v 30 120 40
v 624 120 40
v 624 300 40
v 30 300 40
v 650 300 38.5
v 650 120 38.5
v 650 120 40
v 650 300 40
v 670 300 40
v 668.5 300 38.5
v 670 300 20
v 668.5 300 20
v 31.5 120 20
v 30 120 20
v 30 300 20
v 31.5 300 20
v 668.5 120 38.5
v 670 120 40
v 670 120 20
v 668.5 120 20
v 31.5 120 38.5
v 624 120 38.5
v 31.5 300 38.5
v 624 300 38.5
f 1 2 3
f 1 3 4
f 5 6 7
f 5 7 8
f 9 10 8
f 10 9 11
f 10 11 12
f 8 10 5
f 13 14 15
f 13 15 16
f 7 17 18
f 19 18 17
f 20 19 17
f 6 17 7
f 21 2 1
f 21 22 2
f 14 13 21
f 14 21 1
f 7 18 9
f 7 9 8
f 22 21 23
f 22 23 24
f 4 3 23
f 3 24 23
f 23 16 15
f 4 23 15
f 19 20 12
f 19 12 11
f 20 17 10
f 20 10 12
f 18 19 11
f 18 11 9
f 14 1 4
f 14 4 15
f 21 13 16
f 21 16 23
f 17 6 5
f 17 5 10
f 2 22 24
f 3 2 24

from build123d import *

# Parameters (mm, degrees)
PACK_PANO_KAPAGI_KAPAK_1_START = 120
PACK_PANO_KAPAGI_KAPAK_1_DEPTH = 180
PACK_PANO_KAPAGI_KAPAK_2_START = 27
SKETCH2_W                      = 26
SKETCH2_H                      = 180
PACK_PANO_KAPAGI_KAPAK_2_DEPTH = 14


with BuildPart() as part:
    # Sketch1 → PACK_pano_kapagi_kapak_1 (new body)
    with BuildSketch(Plane(origin=(0, 0, 0), x_dir=(1, 0, 0), z_dir=(0, 1, 0)).offset(PACK_PANO_KAPAGI_KAPAK_1_START)):
        Polygon((30, -40), (30, -20), (31.5, -20), (31.5, -38.5), (668.5, -38.5), (668.5, -20), (670, -20), (670, -40), align=None)
    extrude(amount=PACK_PANO_KAPAGI_KAPAK_1_DEPTH)

    # Sketch2 → PACK_pano_kapagi_kapak_2 (cut)
    with BuildSketch(Plane.XY.offset(PACK_PANO_KAPAGI_KAPAK_2_START)):
        with Locations((637, 210)):
            Rectangle(SKETCH2_W, SKETCH2_H)
    extrude(amount=PACK_PANO_KAPAGI_KAPAK_2_DEPTH, mode=Mode.SUBTRACT)


with BuildPart() as pack_pano_kapagi_kapak_2_piece_1:
    # of the separate pieces the step leaves, piece 1, a body of its own (pack_pano_kapagi_kapak_2_pieces)
    add(part.part.solids().sort_by_distance((30, 120, 40))[0])


with BuildPart() as pack_pano_kapagi_kapak_2_piece_2:
    # of the separate pieces the step leaves, piece 2, a body of its own (pack_pano_kapagi_kapak_2_pieces)
    add(part.part.solids().sort_by_distance((670, 120, 40))[0])


solid = Compound([pack_pano_kapagi_kapak_2_piece_1.part, pack_pano_kapagi_kapak_2_piece_2.part])
